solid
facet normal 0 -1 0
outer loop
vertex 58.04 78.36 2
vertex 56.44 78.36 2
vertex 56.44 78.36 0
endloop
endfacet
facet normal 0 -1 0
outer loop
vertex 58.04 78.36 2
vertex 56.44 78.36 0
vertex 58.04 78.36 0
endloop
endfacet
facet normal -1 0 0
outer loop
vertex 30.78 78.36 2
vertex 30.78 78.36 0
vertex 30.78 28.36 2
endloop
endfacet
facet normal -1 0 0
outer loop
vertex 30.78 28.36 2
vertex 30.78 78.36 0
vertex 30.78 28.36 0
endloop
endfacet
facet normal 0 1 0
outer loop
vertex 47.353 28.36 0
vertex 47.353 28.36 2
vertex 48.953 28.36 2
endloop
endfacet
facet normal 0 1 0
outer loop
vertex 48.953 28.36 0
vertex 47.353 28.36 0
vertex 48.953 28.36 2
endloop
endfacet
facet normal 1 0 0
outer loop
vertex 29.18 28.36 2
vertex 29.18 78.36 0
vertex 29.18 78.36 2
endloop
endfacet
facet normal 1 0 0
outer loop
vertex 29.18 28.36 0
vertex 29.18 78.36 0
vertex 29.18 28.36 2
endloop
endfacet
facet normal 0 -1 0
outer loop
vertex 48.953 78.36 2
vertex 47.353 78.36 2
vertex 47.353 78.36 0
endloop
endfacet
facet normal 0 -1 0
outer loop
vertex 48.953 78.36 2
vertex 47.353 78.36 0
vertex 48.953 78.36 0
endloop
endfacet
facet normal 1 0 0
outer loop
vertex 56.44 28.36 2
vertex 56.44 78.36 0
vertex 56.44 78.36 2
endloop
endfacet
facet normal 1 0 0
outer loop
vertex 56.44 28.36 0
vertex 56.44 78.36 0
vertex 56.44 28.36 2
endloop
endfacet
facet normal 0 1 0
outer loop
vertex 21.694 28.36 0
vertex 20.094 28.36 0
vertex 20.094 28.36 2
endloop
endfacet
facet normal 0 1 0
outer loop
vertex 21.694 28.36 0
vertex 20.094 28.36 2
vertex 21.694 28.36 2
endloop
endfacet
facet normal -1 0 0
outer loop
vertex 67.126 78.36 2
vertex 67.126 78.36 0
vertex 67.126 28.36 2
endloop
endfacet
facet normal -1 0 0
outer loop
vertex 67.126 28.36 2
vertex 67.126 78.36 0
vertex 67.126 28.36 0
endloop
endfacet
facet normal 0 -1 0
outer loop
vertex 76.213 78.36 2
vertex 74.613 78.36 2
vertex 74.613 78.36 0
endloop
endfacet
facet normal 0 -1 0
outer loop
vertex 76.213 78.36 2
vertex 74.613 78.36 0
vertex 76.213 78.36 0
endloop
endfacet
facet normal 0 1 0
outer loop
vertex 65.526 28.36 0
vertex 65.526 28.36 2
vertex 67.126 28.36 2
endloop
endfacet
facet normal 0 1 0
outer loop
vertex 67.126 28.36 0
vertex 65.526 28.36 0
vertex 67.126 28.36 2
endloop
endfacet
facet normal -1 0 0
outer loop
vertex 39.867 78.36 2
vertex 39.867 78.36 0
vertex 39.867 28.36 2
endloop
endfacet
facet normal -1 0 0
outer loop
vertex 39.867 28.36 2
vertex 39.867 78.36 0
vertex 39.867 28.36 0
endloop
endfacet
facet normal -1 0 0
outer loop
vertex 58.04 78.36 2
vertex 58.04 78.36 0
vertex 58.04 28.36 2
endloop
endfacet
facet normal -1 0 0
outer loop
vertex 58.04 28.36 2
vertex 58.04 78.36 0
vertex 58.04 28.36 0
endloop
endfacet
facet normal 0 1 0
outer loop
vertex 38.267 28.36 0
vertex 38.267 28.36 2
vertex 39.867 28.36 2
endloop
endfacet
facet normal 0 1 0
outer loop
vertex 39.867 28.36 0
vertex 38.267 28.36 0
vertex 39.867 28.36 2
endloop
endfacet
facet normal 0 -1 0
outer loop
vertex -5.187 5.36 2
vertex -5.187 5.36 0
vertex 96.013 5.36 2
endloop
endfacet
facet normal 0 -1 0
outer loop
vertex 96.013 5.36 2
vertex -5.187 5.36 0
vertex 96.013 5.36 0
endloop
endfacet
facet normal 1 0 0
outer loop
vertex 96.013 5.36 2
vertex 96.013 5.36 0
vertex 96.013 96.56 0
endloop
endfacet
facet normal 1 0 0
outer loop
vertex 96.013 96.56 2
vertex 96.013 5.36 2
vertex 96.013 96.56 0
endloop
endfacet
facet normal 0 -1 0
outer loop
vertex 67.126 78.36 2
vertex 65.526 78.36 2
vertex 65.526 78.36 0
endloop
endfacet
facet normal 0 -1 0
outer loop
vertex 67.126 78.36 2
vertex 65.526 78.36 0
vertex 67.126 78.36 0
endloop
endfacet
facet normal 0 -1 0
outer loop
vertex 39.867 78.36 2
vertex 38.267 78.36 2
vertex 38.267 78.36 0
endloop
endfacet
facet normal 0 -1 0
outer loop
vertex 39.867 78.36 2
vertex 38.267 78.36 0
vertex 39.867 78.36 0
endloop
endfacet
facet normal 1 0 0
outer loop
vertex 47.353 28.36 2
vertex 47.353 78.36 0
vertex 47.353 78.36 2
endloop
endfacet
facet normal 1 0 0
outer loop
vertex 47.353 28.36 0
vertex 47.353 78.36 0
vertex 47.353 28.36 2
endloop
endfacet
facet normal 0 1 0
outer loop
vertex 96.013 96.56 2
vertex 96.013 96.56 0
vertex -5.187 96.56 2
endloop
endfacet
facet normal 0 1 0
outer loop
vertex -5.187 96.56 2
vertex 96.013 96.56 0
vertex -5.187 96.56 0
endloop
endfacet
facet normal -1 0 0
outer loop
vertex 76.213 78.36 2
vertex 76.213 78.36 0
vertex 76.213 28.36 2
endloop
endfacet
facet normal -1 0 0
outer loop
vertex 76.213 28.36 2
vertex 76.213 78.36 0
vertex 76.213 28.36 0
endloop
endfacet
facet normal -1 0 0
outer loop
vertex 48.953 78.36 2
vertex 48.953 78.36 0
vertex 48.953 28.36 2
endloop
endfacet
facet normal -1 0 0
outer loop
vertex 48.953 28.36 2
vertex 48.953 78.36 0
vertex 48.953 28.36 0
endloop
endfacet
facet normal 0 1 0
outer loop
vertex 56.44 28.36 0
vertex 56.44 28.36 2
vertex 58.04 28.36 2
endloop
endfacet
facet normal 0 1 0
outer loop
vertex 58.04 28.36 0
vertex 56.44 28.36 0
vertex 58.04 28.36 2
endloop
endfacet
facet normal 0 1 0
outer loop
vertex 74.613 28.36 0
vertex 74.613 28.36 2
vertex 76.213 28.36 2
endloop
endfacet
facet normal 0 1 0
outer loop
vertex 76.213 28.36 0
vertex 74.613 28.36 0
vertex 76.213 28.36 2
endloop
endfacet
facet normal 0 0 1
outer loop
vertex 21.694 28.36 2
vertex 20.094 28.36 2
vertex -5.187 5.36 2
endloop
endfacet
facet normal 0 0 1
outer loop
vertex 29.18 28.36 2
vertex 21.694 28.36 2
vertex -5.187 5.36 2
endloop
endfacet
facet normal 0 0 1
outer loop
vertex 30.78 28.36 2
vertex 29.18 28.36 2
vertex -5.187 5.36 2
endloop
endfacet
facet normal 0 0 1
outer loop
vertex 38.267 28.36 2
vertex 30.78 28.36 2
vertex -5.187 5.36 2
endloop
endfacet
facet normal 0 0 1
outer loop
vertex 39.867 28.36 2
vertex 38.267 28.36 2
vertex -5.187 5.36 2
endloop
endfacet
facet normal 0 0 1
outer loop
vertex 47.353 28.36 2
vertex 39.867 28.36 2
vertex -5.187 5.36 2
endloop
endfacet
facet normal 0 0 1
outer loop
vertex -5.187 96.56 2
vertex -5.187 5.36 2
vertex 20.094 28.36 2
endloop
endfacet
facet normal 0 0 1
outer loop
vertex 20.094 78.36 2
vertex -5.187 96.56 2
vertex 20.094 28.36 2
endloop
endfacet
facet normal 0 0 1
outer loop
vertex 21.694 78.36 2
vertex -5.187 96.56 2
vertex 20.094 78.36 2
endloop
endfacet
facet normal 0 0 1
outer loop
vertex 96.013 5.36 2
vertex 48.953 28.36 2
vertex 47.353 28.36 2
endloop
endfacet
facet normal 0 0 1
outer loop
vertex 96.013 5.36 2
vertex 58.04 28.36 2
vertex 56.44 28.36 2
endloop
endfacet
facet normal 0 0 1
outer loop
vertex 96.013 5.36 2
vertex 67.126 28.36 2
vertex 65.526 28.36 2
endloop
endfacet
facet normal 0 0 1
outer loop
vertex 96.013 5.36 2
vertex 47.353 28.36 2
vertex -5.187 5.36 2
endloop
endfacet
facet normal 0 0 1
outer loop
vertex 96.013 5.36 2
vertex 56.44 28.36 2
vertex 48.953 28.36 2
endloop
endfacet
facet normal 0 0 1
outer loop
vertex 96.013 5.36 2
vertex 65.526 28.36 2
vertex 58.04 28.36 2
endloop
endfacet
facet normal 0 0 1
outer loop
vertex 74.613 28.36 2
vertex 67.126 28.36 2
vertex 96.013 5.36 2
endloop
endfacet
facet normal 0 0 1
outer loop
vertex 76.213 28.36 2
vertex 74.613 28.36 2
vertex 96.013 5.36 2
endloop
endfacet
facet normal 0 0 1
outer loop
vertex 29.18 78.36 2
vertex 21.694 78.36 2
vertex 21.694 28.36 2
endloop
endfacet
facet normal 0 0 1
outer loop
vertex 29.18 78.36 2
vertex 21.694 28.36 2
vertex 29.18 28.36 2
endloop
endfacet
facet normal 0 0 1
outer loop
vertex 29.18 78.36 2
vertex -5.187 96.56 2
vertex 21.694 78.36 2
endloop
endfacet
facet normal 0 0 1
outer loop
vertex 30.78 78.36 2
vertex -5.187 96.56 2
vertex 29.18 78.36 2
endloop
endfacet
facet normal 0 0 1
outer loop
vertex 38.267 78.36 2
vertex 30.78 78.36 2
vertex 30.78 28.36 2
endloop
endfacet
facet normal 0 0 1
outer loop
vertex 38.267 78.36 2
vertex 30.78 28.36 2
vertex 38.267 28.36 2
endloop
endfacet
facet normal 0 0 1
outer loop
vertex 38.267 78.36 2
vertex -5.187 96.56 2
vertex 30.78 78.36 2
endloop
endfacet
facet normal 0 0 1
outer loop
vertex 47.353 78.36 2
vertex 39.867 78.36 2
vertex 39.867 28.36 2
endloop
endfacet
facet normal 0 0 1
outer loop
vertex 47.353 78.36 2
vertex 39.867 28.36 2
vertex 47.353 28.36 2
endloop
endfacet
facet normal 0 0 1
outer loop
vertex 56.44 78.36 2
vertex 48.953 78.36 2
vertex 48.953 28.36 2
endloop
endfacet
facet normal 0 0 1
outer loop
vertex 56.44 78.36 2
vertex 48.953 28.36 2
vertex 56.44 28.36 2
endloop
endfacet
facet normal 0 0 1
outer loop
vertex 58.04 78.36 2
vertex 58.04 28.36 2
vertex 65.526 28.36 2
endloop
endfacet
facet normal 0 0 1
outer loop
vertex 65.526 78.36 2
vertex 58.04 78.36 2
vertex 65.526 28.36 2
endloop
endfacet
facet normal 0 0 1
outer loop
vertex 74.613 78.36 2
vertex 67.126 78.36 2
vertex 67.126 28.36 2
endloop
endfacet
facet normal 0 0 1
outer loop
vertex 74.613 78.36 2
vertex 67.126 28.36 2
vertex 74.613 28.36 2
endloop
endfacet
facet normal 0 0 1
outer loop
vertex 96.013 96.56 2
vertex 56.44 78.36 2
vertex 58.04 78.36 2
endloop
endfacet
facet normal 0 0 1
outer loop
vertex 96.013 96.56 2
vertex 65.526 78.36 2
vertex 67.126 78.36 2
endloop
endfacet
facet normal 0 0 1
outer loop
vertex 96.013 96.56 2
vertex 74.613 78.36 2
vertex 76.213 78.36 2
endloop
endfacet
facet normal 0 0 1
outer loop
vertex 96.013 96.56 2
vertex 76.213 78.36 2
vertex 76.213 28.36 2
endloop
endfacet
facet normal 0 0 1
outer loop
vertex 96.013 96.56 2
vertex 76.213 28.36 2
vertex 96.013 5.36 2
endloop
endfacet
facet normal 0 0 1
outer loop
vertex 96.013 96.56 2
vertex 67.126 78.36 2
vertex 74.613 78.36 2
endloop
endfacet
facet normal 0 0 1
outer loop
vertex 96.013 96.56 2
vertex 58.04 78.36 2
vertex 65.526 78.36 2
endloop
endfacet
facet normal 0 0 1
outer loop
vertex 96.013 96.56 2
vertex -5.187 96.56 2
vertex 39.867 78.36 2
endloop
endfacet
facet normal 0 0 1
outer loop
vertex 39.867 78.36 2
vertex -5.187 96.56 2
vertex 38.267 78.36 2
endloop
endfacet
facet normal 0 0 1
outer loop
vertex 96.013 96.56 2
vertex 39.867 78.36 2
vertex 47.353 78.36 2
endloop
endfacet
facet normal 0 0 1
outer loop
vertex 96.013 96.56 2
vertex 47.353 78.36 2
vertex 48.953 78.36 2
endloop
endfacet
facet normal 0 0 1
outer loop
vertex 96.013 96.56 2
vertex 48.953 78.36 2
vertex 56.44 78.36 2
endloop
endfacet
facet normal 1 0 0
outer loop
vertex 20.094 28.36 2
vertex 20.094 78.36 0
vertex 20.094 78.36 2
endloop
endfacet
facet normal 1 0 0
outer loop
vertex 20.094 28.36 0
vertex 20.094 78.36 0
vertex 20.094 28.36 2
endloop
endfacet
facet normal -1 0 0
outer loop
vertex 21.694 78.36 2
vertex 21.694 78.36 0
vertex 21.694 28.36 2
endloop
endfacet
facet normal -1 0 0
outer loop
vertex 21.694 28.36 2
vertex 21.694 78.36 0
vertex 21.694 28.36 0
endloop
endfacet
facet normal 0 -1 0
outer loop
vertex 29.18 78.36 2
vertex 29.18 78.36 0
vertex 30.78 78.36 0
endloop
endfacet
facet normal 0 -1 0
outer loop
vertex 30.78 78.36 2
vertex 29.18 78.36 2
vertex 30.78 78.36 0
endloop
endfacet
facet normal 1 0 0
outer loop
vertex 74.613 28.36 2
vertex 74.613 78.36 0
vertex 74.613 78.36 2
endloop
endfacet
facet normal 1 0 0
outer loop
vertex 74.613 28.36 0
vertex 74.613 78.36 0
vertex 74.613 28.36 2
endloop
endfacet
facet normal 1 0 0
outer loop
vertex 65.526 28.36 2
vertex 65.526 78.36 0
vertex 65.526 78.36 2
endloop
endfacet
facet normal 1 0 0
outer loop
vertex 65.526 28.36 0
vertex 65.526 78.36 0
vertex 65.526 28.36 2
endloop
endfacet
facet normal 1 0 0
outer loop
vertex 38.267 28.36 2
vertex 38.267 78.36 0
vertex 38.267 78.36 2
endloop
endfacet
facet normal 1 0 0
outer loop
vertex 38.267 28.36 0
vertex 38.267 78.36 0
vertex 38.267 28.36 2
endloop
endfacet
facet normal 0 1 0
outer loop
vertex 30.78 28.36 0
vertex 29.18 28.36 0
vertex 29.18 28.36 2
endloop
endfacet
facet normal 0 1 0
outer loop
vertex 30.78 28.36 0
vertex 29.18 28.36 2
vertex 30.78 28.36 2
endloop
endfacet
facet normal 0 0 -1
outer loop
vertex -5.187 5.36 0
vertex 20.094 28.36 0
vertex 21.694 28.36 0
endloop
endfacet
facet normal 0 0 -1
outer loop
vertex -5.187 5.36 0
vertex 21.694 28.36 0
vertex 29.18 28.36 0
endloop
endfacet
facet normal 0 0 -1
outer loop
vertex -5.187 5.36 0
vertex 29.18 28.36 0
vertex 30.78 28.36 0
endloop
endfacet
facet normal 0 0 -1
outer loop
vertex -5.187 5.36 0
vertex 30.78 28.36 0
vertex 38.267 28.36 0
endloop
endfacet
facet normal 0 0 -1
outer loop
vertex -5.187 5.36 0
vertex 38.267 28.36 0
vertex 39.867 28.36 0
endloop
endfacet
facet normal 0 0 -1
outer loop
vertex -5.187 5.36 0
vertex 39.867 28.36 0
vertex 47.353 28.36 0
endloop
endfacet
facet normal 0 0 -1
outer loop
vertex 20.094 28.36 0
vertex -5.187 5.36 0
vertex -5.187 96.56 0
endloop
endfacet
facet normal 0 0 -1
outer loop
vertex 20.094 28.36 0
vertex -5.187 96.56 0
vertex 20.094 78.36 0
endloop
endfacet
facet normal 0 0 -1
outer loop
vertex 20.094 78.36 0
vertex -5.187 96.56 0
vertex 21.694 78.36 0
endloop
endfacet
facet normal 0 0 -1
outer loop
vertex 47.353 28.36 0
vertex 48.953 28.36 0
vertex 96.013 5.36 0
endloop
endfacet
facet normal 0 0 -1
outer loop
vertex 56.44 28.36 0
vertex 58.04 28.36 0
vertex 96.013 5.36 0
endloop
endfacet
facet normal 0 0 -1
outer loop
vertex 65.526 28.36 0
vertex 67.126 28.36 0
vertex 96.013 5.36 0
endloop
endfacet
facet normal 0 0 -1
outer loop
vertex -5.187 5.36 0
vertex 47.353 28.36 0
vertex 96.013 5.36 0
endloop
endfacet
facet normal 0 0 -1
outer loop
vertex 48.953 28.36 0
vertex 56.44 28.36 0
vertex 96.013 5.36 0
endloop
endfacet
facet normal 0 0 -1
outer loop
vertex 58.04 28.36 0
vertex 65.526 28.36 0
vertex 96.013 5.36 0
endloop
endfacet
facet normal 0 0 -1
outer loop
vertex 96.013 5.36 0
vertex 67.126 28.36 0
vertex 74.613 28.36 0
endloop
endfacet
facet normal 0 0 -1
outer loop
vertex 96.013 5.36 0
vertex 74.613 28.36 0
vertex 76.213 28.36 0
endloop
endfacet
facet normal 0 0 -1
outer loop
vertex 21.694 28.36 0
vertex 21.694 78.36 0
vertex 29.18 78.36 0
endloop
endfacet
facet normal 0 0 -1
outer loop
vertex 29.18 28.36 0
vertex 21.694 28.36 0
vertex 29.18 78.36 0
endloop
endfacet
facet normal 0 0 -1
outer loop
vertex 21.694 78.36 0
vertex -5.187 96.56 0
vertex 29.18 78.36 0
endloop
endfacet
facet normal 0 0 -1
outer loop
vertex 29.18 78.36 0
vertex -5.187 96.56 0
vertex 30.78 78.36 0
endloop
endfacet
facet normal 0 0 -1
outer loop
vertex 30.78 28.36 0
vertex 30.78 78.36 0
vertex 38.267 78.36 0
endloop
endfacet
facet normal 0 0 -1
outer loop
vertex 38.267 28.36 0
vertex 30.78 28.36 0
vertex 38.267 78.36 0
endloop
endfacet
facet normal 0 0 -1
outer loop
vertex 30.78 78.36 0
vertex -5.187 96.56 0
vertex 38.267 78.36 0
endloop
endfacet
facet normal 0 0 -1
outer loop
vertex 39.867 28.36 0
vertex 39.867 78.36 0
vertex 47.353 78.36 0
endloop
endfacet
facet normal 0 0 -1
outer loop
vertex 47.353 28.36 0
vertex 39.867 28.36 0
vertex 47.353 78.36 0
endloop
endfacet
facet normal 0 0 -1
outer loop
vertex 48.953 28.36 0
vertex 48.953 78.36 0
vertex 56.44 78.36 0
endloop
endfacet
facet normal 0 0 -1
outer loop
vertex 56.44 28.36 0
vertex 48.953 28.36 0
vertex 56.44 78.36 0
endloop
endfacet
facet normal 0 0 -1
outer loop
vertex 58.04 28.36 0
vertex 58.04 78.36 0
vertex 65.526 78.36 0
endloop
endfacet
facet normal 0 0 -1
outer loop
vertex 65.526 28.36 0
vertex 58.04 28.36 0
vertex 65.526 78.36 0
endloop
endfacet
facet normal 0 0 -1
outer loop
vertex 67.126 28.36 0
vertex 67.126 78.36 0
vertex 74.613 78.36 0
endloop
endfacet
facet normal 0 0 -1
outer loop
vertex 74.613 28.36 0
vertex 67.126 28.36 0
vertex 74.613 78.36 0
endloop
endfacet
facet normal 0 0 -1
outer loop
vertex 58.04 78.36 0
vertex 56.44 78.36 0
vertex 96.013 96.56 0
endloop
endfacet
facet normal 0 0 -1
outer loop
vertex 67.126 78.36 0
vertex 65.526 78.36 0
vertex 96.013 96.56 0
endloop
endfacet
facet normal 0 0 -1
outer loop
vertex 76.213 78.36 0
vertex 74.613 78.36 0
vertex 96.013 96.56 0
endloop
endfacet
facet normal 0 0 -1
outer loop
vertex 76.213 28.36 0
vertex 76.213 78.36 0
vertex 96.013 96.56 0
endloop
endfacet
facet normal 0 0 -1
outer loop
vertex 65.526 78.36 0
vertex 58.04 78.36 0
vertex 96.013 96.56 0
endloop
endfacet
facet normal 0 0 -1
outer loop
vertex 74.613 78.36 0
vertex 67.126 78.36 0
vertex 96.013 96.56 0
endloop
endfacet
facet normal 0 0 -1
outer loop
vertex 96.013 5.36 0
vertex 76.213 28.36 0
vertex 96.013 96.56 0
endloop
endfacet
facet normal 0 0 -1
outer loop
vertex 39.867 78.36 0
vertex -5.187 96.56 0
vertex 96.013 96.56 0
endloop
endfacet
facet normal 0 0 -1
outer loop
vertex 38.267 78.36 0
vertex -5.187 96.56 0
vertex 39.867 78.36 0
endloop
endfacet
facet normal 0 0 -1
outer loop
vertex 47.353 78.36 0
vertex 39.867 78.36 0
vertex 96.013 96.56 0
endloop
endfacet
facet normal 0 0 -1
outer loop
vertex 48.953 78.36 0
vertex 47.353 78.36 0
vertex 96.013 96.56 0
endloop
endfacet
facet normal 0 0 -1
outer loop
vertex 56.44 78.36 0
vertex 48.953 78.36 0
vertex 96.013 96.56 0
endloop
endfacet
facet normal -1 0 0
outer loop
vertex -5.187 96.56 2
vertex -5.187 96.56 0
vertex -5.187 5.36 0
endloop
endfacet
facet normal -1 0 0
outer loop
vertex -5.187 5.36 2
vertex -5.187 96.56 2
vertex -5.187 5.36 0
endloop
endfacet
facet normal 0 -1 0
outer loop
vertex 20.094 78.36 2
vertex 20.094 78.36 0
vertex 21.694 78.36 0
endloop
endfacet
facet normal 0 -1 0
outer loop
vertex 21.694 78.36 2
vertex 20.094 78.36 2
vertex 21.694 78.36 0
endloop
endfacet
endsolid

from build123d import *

# Parameters (mm, degrees)
BOSS_EXTRUDE1_DEPTH = 2
SKETCH4_W           = 1.6
SKETCH4_H           = 50
CUT_EXTRUDE1_DEPTH  = 10


with BuildPart() as part:
    # Sketch1 → Boss-Extrude1 (new body)
    with BuildSketch(Plane.XY):
        Polygon((-3.987299975, 5.359519273), (94.812700025, 5.359519273), (96.012700025, 5.359519273), (96.012700025, 96.559519273), (-5.187299975, 96.559519273), (-5.187299975, 5.359519273), align=None)
    extrude(amount=BOSS_EXTRUDE1_DEPTH)

    # Sketch4 → Cut-Extrude1 (cut)
    with BuildSketch(Plane(origin=(0, 0, 0), x_dir=(1, 0, 0), z_dir=(0, 0, -1))):
        with Locations((20.893777412, -53.359519273)):
            Rectangle(SKETCH4_W, SKETCH4_H)
        with Locations((29.980264514, -53.359519273)):
            Rectangle(SKETCH4_W, SKETCH4_H)
        with Locations((39.066751616, -53.359519273)):
            Rectangle(SKETCH4_W, SKETCH4_H)
        with Locations((48.153238719, -53.359519273)):
            Rectangle(SKETCH4_W, SKETCH4_H)
        with Locations((57.239725821, -53.359519273)):
            Rectangle(SKETCH4_W, SKETCH4_H)
        with Locations((66.326212923, -53.359519273)):
            Rectangle(SKETCH4_W, SKETCH4_H)
        with Locations((75.412700025, -53.359519273)):
            Rectangle(SKETCH4_W, SKETCH4_H)
    extrude(amount=-CUT_EXTRUDE1_DEPTH, mode=Mode.SUBTRACT)


solid = part.part
